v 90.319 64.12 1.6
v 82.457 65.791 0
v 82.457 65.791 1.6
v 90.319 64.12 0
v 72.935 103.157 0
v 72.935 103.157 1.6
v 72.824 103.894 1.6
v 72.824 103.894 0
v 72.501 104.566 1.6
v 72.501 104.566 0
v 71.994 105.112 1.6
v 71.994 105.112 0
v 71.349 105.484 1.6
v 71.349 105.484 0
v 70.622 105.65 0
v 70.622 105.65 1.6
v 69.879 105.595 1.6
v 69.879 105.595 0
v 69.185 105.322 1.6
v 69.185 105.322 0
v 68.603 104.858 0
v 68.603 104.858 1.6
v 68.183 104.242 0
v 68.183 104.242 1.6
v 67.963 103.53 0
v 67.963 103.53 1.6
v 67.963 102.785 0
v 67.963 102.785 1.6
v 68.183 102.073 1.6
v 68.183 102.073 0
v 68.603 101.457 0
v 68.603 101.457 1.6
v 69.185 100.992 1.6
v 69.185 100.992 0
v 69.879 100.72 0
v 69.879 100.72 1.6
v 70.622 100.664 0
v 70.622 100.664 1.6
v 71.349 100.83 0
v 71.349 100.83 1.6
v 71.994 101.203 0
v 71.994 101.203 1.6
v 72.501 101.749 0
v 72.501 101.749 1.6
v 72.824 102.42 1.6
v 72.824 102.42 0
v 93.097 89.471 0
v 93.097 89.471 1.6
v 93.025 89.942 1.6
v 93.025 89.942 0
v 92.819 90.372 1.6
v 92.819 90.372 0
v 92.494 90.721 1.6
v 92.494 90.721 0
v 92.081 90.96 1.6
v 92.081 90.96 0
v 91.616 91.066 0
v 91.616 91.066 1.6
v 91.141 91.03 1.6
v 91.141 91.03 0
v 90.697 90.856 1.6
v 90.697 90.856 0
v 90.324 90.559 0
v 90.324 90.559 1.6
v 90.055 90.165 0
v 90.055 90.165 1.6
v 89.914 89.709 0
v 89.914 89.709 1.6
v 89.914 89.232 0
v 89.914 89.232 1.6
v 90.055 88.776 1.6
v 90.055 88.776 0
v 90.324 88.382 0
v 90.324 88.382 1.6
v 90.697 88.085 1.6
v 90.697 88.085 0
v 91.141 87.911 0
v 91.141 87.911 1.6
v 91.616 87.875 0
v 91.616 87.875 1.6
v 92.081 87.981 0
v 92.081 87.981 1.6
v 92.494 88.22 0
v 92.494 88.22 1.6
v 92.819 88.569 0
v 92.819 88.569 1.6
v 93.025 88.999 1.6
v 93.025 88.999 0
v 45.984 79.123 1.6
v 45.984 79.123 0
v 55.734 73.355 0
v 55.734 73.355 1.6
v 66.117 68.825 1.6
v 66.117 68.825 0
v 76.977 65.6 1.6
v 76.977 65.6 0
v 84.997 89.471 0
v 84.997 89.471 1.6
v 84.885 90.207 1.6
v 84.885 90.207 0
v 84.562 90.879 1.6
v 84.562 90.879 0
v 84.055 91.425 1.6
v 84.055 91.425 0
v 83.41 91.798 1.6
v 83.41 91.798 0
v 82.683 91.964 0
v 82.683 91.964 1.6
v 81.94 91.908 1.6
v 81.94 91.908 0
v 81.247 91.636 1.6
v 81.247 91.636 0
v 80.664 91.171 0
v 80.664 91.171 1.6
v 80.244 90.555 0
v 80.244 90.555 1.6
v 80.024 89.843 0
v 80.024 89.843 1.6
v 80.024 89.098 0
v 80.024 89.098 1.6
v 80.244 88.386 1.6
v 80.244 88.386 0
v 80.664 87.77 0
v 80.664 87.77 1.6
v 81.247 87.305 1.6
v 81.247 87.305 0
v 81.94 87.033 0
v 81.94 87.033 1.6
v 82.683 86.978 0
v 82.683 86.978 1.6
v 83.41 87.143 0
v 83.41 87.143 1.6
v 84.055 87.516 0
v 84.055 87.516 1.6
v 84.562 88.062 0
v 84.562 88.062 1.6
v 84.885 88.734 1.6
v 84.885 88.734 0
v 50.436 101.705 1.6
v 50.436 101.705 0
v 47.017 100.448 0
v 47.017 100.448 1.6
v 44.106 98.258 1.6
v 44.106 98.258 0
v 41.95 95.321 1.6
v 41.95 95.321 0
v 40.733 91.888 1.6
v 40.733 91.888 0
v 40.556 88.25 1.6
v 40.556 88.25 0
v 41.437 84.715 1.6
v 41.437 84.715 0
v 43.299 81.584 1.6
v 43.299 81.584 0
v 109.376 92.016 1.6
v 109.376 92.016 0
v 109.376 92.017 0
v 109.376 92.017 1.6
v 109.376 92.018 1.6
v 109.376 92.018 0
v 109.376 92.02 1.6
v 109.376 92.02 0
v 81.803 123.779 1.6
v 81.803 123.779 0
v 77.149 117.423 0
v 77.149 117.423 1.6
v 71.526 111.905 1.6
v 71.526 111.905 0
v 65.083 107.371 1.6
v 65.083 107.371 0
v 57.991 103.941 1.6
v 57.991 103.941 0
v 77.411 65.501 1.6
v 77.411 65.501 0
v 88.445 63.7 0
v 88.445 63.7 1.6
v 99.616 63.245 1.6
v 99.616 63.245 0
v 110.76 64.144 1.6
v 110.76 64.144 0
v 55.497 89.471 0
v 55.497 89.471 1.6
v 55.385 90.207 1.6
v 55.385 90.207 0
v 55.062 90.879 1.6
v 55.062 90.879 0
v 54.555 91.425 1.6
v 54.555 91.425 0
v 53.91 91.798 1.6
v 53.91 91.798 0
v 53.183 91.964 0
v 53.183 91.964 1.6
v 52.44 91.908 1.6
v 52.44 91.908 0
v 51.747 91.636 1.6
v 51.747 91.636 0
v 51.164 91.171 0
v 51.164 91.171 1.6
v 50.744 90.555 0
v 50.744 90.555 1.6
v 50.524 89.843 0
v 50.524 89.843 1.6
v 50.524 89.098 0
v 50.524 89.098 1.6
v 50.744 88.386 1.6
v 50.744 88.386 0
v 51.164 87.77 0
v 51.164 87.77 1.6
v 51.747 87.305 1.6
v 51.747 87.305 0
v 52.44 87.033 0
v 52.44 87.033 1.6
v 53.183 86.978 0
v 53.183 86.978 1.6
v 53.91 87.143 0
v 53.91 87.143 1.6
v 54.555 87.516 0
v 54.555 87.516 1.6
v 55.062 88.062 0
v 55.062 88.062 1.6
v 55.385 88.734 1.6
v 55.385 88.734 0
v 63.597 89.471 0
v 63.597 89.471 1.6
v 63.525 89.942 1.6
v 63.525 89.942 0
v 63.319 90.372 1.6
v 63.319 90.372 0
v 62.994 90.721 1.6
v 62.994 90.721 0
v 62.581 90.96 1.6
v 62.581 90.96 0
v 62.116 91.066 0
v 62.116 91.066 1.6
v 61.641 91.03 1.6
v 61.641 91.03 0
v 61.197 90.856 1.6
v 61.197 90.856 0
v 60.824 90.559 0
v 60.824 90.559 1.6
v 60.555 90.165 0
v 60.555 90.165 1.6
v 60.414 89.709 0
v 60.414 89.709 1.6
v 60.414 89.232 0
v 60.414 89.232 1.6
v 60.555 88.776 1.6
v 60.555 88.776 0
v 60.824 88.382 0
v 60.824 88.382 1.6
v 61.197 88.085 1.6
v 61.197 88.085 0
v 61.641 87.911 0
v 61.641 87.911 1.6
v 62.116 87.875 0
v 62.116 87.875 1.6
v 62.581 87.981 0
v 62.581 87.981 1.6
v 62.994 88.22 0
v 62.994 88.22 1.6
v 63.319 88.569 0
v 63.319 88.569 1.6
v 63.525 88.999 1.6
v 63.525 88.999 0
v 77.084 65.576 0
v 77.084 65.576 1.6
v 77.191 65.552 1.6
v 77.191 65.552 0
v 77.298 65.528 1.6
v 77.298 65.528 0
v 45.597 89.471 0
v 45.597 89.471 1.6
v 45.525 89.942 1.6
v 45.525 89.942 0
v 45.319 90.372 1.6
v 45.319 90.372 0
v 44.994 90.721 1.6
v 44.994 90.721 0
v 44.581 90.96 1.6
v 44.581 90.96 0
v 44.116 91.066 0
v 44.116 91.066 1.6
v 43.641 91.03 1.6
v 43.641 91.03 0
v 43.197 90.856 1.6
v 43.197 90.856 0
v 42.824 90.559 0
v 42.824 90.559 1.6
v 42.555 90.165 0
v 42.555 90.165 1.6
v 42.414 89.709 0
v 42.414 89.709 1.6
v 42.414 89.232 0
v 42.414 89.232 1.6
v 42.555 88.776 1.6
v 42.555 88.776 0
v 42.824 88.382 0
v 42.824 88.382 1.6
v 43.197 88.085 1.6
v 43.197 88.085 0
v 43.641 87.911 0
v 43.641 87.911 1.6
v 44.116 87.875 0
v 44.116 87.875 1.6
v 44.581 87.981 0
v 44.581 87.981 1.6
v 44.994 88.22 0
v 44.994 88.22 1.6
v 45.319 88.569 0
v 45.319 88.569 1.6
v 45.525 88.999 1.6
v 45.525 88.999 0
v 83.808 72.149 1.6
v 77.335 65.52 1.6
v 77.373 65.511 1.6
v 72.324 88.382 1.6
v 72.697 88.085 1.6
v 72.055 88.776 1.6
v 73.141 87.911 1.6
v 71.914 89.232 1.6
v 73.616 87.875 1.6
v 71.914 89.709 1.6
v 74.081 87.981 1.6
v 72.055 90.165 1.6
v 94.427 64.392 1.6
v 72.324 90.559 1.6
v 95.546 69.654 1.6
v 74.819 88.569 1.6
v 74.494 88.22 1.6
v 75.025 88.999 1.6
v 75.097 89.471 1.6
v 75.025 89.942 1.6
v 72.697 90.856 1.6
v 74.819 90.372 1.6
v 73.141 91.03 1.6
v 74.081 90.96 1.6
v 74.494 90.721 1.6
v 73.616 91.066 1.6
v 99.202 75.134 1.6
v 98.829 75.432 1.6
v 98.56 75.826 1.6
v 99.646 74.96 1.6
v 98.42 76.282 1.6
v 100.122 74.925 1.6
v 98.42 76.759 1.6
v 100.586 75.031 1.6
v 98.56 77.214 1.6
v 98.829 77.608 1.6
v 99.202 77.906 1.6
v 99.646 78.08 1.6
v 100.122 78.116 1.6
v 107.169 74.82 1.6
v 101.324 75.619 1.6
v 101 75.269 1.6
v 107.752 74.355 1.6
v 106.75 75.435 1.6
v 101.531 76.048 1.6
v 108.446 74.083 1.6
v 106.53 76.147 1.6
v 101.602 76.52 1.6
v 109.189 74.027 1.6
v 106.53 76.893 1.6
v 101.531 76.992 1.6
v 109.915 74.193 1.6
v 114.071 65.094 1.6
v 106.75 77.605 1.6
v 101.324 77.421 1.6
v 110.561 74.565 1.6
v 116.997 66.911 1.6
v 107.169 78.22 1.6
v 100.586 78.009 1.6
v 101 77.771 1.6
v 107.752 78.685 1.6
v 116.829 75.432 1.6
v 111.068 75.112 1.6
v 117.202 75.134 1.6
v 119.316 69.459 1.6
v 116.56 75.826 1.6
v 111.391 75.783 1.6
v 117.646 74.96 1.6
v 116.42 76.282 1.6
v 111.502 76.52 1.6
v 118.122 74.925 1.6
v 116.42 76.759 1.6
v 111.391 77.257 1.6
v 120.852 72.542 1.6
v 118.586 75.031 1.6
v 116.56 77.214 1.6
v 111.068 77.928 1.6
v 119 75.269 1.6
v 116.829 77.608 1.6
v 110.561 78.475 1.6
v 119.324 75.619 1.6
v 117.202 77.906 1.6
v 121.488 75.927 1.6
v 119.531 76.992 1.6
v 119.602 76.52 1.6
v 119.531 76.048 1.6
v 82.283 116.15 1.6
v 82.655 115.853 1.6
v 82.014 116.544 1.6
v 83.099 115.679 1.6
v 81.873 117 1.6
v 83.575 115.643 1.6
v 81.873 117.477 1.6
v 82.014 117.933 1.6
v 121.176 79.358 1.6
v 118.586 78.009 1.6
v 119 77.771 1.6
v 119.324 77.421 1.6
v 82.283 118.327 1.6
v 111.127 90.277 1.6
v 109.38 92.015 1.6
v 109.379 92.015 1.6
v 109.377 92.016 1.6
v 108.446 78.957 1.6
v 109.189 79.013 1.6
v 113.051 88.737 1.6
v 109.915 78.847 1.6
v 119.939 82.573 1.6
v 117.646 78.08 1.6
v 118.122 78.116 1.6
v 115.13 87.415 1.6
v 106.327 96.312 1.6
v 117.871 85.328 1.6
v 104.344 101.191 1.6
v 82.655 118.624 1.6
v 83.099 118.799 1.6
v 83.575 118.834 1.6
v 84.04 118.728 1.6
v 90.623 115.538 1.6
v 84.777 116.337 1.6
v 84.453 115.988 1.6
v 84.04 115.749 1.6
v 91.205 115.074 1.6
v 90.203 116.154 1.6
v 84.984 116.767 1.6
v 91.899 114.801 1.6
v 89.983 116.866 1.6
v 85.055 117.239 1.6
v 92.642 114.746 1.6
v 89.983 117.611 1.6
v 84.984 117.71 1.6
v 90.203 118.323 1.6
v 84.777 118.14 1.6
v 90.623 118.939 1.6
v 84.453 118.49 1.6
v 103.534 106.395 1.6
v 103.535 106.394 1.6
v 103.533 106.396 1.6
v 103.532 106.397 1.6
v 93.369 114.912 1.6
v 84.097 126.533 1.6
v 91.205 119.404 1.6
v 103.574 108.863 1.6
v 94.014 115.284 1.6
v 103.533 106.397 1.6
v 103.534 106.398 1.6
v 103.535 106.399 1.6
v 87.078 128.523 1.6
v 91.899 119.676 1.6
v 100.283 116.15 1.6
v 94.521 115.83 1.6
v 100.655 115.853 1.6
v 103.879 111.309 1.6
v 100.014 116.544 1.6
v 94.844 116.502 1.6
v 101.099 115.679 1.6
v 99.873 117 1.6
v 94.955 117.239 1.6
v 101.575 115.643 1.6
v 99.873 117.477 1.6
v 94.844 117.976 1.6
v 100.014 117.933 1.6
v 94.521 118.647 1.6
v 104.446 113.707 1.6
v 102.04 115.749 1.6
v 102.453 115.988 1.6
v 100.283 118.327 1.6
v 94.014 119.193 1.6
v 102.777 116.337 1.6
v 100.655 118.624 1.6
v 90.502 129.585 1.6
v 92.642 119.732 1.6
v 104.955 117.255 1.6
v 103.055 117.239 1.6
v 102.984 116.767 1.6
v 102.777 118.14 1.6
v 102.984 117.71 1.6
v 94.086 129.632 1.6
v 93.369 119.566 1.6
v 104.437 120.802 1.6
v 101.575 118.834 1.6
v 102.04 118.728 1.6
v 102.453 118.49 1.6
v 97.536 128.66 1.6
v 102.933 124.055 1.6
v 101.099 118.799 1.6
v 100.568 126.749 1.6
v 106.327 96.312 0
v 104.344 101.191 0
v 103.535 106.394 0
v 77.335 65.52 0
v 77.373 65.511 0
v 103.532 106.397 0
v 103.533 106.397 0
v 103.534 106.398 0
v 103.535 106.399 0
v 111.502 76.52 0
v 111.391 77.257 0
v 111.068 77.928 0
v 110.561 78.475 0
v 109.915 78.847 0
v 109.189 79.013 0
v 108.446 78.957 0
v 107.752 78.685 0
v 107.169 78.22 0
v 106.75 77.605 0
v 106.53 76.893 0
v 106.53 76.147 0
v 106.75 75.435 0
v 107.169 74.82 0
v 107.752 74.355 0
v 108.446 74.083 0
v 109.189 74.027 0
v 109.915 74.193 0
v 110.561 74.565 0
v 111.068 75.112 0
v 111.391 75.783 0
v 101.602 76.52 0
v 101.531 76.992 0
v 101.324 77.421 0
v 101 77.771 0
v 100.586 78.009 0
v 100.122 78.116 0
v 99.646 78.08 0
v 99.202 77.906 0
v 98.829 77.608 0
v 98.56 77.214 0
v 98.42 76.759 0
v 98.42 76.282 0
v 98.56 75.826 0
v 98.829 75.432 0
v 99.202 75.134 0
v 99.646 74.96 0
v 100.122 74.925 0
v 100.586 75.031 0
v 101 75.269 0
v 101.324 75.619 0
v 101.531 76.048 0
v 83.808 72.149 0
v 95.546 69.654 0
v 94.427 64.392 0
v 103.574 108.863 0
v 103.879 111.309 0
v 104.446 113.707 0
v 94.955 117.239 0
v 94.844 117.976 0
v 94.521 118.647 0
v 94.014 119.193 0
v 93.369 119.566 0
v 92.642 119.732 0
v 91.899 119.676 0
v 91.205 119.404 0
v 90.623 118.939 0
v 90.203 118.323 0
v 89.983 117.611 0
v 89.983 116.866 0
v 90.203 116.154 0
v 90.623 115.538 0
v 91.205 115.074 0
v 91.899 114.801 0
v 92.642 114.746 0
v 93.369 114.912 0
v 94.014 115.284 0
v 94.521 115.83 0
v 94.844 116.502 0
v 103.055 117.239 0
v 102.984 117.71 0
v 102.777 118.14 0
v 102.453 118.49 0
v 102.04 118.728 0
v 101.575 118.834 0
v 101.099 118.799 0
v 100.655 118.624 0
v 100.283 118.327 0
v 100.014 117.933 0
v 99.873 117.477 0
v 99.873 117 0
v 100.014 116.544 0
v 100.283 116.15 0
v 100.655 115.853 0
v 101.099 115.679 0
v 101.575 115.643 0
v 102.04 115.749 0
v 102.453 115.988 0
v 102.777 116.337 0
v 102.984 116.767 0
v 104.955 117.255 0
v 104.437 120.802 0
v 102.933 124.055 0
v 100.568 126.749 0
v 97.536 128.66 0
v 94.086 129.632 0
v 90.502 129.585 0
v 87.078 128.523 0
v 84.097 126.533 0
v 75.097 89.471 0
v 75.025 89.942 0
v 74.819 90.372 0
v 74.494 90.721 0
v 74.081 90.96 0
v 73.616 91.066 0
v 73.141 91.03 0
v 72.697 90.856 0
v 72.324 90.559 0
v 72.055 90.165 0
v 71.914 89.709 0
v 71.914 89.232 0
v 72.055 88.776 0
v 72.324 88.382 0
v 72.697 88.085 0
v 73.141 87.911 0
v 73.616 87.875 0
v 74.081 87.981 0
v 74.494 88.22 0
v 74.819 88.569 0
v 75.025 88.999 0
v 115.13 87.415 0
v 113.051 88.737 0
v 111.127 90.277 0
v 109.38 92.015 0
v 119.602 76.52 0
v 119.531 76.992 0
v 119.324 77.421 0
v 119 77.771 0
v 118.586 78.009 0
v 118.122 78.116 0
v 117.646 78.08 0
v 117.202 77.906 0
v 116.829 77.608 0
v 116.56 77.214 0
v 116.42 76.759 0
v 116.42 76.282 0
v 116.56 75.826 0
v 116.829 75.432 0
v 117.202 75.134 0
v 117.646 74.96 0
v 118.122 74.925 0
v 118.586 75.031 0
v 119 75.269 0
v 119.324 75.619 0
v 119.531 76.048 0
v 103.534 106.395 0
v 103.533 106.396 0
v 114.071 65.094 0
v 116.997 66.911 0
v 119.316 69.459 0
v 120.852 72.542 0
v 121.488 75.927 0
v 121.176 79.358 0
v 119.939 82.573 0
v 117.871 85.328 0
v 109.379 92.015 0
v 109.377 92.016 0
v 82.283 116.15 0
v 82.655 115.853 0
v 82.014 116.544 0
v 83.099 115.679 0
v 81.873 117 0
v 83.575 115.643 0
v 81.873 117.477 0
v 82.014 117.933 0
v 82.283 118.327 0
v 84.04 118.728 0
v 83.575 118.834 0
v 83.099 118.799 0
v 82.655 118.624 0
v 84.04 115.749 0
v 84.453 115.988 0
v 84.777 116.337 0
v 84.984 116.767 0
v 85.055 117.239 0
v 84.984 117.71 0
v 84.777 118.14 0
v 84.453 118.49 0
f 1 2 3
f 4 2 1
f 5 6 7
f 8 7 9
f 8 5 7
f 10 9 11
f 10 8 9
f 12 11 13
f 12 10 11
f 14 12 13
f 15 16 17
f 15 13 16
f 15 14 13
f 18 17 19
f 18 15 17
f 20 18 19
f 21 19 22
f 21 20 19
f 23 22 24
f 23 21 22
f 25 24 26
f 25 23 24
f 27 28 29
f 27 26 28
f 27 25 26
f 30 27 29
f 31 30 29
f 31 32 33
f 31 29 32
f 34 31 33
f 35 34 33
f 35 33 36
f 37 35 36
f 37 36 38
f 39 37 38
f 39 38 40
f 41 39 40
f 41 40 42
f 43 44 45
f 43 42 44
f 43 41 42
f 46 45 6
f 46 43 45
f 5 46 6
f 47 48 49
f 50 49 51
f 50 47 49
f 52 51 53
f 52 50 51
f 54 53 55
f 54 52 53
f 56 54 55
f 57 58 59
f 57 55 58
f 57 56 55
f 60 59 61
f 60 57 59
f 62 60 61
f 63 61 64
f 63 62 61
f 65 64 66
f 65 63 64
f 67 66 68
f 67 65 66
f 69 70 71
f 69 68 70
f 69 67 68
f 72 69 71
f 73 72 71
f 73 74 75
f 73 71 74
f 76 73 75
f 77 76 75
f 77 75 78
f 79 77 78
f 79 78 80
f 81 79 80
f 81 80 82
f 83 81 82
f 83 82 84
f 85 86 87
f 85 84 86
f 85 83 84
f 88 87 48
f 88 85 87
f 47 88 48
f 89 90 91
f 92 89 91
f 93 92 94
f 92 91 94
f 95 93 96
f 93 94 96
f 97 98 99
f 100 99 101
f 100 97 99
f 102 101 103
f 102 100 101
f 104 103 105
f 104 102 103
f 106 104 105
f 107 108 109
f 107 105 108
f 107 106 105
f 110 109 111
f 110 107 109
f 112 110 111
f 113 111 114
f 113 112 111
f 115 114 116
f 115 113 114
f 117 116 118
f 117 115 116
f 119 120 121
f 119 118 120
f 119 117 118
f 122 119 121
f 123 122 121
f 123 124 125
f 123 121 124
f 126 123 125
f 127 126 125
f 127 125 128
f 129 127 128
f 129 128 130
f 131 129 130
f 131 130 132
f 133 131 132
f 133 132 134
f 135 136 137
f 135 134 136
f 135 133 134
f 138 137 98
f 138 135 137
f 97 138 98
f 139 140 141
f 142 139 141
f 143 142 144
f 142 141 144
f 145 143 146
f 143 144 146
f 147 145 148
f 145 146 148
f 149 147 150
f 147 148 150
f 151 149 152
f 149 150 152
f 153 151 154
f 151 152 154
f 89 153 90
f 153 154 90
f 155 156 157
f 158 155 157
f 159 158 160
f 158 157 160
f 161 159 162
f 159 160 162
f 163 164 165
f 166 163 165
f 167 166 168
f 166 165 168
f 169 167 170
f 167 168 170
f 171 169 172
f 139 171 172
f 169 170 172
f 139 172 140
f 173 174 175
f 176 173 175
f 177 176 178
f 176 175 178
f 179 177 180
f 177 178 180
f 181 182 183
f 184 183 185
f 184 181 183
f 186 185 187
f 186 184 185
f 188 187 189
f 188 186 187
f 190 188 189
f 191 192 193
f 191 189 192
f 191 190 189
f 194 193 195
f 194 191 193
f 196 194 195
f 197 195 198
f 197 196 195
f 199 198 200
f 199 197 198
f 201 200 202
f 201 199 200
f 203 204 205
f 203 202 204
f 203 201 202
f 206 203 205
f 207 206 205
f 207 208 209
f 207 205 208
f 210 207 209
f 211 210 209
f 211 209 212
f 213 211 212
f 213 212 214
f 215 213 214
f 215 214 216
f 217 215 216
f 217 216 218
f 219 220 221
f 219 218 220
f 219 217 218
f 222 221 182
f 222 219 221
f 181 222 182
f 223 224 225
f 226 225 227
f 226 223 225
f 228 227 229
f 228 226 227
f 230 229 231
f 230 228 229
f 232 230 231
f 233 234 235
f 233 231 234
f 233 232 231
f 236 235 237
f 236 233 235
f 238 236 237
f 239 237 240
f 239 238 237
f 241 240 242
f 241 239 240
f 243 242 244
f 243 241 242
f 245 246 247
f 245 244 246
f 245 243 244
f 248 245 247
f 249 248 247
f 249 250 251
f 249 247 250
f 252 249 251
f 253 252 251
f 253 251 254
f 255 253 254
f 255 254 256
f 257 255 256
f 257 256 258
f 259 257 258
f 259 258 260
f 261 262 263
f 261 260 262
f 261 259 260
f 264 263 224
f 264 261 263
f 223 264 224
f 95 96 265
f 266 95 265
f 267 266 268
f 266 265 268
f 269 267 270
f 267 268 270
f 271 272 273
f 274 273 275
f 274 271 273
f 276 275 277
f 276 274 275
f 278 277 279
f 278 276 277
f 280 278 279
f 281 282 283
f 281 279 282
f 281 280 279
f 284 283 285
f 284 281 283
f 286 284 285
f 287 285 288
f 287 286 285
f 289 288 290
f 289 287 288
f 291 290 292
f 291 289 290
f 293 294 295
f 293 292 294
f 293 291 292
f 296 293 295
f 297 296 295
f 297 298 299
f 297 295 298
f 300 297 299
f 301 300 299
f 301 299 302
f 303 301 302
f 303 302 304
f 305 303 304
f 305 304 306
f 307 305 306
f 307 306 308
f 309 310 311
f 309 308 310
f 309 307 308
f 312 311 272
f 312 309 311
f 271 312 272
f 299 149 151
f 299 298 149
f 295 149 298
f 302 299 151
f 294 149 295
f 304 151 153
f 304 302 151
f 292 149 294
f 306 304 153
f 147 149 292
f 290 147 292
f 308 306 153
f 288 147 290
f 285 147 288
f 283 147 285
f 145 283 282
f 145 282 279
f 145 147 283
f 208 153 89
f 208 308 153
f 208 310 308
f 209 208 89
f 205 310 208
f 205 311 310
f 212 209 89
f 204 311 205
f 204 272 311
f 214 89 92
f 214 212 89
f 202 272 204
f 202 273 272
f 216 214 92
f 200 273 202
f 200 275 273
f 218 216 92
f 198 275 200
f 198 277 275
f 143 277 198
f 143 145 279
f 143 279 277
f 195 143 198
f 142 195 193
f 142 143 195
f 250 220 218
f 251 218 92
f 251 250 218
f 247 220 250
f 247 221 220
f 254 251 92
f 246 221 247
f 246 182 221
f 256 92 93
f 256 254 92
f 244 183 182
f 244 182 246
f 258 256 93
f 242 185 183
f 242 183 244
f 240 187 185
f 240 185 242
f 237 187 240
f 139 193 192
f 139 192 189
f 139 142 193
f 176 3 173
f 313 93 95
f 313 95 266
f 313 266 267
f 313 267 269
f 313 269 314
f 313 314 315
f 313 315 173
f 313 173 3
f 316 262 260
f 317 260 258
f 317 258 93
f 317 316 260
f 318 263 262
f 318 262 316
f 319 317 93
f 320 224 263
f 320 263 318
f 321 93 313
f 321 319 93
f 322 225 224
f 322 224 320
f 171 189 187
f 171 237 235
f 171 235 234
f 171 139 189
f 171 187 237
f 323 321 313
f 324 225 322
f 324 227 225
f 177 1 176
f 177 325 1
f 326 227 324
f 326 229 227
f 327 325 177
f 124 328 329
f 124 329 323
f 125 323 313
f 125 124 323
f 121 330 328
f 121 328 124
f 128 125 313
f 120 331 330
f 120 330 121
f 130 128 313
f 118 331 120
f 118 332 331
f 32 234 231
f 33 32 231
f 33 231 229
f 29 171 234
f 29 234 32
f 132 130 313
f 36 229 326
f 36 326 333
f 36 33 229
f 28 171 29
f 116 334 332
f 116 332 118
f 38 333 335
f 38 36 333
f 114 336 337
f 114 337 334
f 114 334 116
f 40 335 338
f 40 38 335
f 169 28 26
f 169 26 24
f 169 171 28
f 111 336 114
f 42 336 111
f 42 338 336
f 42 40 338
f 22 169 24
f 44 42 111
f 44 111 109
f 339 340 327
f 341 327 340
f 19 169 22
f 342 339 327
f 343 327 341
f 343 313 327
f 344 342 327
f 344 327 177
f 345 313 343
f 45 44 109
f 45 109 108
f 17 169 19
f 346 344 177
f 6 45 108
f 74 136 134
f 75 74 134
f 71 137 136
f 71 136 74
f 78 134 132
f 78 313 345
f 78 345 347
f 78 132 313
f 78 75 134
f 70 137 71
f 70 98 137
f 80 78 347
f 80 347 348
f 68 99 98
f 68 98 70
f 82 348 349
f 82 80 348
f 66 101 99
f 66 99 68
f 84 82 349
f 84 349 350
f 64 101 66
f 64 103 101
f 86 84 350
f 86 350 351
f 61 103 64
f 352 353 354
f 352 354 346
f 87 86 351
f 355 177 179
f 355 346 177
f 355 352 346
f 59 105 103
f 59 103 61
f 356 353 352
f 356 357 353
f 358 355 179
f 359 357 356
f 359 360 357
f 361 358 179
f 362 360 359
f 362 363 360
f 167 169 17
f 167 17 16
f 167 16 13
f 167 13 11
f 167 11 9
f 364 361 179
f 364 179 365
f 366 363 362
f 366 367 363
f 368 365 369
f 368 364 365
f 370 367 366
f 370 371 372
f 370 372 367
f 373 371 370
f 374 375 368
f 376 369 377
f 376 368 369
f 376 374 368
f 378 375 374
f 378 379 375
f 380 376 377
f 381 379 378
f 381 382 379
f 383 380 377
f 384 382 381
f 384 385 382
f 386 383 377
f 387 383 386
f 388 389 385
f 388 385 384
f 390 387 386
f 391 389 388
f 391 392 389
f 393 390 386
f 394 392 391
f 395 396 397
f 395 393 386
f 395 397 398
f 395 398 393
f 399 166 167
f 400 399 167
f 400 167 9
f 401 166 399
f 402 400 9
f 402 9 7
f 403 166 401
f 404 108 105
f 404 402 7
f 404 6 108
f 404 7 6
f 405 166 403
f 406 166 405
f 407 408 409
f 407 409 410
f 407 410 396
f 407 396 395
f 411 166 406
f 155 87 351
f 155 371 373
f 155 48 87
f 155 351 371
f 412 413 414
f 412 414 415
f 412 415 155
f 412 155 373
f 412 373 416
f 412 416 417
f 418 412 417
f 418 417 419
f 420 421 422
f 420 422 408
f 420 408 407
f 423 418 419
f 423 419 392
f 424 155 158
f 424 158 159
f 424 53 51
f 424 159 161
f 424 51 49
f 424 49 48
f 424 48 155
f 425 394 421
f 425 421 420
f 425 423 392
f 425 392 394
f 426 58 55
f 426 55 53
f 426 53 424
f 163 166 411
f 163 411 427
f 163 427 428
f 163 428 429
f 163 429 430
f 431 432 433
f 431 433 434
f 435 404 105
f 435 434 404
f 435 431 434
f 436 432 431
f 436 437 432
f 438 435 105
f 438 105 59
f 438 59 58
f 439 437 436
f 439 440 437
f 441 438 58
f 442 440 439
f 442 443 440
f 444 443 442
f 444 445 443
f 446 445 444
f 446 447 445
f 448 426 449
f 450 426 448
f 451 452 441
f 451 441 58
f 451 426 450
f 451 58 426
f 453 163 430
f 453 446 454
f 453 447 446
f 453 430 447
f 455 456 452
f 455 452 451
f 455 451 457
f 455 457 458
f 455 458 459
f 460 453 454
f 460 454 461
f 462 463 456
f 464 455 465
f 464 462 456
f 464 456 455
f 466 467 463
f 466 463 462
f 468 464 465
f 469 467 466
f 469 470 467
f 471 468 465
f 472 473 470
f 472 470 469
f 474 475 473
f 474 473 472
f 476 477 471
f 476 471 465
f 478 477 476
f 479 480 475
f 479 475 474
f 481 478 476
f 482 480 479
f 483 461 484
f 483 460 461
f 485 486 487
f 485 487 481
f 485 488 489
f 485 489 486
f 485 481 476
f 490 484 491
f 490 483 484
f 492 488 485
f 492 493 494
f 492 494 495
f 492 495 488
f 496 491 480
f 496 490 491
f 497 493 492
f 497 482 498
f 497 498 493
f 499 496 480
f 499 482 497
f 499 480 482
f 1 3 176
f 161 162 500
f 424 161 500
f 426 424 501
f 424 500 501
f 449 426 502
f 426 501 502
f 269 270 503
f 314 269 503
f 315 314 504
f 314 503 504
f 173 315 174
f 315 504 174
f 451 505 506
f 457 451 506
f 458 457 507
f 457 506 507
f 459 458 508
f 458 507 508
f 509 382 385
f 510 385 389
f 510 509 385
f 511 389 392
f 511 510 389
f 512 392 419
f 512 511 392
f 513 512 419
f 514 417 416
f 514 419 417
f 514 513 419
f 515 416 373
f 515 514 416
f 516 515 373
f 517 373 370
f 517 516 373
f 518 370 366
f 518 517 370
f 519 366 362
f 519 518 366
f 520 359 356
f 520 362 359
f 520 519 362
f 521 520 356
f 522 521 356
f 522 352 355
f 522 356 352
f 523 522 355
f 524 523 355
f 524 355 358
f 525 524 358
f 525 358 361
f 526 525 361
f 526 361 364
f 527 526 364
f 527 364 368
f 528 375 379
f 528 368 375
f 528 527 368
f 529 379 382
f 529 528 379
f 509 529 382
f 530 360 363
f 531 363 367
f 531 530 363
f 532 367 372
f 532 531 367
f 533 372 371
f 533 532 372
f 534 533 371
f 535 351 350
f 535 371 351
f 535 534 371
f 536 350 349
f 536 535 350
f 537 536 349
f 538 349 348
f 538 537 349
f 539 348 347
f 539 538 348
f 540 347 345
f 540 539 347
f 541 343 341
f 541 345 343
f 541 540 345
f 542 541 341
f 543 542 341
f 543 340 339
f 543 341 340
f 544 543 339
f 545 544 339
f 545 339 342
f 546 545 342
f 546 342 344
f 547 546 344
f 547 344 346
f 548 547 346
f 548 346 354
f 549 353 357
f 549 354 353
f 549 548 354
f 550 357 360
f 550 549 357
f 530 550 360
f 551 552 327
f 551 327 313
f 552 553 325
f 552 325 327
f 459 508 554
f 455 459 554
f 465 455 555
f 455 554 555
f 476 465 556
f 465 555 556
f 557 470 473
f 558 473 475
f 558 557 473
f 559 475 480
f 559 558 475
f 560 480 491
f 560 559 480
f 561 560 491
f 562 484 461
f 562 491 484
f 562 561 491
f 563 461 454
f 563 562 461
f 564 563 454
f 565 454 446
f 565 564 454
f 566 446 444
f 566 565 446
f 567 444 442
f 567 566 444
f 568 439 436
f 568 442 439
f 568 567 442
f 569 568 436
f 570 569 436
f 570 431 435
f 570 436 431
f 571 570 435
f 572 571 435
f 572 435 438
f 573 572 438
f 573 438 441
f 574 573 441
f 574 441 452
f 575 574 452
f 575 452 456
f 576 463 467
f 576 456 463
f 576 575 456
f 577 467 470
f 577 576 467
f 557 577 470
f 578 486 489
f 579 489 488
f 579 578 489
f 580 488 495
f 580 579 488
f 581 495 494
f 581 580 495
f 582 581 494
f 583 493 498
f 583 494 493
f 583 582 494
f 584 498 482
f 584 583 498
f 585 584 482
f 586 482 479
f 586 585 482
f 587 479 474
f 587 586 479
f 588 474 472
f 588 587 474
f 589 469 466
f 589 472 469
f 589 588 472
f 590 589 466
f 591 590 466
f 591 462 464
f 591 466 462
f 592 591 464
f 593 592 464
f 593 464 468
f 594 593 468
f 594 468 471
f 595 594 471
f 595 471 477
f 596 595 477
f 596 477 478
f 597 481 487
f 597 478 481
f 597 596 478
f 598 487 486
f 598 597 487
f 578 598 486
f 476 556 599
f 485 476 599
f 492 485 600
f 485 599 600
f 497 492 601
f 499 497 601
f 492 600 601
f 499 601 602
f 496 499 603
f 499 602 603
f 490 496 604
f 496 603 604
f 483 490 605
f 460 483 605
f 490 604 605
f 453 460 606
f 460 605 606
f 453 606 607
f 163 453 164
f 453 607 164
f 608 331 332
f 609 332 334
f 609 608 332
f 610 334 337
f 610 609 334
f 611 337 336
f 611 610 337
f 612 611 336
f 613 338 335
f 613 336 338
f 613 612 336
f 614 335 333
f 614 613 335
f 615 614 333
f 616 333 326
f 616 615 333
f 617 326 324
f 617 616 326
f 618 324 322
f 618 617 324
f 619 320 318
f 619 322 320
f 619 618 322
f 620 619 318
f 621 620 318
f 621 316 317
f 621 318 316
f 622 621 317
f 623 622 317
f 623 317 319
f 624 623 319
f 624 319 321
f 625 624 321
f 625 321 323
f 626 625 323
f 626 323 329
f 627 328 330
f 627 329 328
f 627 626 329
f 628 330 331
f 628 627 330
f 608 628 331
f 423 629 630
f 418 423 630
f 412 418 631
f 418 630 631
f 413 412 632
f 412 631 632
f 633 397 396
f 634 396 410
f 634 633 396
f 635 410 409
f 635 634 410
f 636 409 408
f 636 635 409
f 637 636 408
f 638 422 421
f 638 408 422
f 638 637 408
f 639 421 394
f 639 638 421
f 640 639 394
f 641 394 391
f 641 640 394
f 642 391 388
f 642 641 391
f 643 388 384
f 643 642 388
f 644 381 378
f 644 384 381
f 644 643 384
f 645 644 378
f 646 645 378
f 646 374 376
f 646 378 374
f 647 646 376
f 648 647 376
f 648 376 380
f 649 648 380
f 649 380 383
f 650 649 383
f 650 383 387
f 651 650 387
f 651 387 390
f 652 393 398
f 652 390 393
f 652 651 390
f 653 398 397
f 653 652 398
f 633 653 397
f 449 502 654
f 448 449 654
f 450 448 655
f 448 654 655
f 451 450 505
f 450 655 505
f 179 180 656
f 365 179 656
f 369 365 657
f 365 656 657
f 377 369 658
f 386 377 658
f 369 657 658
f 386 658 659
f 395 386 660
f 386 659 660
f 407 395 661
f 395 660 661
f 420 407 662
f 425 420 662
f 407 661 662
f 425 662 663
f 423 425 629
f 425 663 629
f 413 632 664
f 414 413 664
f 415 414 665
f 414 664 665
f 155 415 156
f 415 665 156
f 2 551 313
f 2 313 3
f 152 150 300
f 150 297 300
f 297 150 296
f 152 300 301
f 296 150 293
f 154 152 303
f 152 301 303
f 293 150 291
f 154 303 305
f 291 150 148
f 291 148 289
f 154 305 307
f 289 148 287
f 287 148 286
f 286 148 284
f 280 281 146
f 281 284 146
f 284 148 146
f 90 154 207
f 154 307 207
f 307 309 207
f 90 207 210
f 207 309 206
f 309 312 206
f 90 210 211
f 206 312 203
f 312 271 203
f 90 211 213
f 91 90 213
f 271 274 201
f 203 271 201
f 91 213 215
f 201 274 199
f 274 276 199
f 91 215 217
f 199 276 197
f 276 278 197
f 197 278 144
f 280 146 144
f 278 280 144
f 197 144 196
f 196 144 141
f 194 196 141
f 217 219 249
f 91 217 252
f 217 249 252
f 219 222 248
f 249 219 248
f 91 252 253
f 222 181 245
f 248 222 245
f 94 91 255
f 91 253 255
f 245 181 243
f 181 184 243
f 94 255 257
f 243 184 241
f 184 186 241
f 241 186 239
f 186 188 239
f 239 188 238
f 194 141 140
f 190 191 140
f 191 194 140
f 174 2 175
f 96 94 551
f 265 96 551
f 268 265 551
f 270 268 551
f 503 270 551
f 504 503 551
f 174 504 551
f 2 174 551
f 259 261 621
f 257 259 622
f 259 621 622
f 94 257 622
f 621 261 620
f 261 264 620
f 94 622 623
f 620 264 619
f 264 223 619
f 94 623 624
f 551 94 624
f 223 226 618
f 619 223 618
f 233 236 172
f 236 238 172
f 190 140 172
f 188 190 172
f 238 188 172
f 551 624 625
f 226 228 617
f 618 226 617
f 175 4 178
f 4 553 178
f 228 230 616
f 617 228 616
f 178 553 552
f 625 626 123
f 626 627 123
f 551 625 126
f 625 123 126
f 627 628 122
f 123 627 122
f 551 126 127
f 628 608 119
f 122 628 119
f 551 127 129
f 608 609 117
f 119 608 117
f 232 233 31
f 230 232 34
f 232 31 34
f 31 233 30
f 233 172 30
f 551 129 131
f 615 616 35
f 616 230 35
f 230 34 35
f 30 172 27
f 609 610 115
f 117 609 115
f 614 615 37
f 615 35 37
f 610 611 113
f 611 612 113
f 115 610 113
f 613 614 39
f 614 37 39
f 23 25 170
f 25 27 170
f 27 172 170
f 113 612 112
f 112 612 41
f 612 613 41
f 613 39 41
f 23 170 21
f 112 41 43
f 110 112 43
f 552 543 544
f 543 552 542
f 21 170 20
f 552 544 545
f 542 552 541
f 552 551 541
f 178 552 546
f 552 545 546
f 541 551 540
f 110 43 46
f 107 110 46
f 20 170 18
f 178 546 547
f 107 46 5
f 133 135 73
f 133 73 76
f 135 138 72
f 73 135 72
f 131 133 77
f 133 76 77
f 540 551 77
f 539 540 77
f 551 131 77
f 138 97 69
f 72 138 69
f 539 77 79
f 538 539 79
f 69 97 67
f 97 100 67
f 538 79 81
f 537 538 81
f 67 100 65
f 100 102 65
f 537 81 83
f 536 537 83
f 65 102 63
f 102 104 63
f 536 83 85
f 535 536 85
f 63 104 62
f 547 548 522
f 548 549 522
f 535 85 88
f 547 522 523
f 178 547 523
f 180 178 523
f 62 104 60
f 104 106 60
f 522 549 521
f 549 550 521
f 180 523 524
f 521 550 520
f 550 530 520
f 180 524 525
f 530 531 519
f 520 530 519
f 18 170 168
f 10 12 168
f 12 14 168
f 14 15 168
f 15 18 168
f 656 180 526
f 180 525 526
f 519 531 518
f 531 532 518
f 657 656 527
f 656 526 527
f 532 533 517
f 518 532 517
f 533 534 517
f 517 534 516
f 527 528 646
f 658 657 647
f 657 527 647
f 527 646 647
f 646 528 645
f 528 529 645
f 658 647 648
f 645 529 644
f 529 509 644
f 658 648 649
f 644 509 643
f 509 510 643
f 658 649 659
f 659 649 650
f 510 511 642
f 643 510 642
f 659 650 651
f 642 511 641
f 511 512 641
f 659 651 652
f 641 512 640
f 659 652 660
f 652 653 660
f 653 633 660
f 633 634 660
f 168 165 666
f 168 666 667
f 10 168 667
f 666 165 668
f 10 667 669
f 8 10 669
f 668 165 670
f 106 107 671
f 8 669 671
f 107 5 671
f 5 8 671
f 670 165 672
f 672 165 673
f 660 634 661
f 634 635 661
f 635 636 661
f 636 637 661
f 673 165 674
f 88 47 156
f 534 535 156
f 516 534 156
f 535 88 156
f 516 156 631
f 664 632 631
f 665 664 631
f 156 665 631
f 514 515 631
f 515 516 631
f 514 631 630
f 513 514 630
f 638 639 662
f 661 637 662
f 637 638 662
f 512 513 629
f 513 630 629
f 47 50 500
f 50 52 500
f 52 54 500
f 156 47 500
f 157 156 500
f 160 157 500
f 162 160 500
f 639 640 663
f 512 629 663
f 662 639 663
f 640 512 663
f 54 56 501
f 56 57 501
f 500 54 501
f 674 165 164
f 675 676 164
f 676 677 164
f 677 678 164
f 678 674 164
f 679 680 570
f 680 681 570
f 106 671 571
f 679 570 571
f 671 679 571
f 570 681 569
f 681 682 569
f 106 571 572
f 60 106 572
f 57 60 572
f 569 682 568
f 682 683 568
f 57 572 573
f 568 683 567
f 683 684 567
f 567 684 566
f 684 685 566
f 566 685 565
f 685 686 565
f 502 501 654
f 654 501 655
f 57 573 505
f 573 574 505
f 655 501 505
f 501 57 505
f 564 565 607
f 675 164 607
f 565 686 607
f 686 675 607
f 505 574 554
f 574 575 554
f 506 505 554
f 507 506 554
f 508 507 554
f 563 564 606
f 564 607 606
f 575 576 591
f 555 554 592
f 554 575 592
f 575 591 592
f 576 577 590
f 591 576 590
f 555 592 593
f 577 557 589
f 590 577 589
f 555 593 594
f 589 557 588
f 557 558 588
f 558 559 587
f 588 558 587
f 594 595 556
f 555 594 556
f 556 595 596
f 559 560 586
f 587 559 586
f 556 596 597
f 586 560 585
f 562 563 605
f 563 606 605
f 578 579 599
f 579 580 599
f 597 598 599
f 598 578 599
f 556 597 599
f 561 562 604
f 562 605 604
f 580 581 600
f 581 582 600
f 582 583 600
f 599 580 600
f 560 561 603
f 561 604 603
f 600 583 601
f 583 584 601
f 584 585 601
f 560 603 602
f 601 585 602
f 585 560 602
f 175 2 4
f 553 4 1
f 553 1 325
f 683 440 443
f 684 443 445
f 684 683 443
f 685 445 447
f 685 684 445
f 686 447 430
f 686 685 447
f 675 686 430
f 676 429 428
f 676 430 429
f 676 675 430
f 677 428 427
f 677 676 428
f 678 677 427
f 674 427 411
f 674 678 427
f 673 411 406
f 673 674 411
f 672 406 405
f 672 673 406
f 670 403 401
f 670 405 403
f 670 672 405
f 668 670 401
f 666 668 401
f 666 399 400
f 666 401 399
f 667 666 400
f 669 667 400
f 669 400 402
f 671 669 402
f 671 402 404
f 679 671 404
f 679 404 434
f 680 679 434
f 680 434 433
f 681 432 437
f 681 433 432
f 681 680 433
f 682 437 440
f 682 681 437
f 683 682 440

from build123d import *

# Parameters (mm, degrees)
BOSS_EXTRUDE1_DEPTH = 1.6
SKETCH8_3_R         = 2.5
CUT_EXTRUDE1_DEPTH  = 178.756608161
SKETCH25_R          = 2.5
CUT_EXTRUDE2_DEPTH  = 178.756608161
SKETCH16_R          = 1.6
CUT_EXTRUDE3_DEPTH  = 178.756608161
CUT_EXTRUDE6_DEPTH  = 175.275284078


with BuildPart() as part:
    # Sketch8 → Boss-Extrude1 (new body)
    with BuildSketch(Plane.XY):
        with BuildLine():
            ThreePointArc((103.534701401, 106.398987898), (103.693161759, 110.090138371), (104.446158593, 113.707139515))
            ThreePointArc((104.446158593, 113.707139515), (97.535722451, 128.659745128), (81.803110207, 123.779227301))
            ThreePointArc((81.803110207, 123.779227301), (68.396685685, 109.506582784), (50.436082024, 101.705472858))
            ThreePointArc((50.436082024, 101.705472858), (40.732585656, 91.888172428), (45.984244445, 79.122699094))
            ThreePointArc((45.984244445, 79.122699094), (60.856228216, 70.93053968), (76.976923111, 65.600382715))
            ThreePointArc((76.976923111, 65.600382715), (77.137220348, 65.563882378), (77.2977589, 65.528458486))
            ThreePointArc((77.2977589, 65.528458486), (77.354298773, 65.515492739), (77.410522602, 65.501218676))
            ThreePointArc((77.410522602, 65.501218676), (94.023303804, 63.303193357), (110.759742778, 64.144278965))
            ThreePointArc((110.759742778, 64.144278965), (121.287127646, 74.212620667), (115.130462452, 87.414620912))
            ThreePointArc((115.130462452, 87.414620912), (112.067901623, 89.481121015), (109.379631064, 92.015465685))
            ThreePointArc((109.379631064, 92.015465685), (109.377986421, 92.015505684), (109.376341775, 92.015545509))
            ThreePointArc((109.376341775, 92.015545509), (109.37615287, 92.017539878), (109.375963817, 92.019534234))
            ThreePointArc((109.375963817, 92.019534234), (105.194093866, 98.693961054), (103.534911629, 106.393514545))
            ThreePointArc((103.534911629, 106.393514545), (103.533655951, 106.395075463), (103.532400156, 106.396636288))
            ThreePointArc((103.532400156, 106.396636288), (103.533550841, 106.397812032), (103.534701401, 106.398987898))
        make_face()
    extrude(amount=BOSS_EXTRUDE1_DEPTH)

    # Sketch8<3> → Cut-Extrude1 (cut, through all)
    with BuildSketch(Plane.XY):
        with Locations((70.435309654, 103.157249982)):
            Circle(SKETCH8_3_R)
    extrude(amount=CUT_EXTRUDE1_DEPTH, mode=Mode.SUBTRACT)

    # Sketch25 → Cut-Extrude2 (cut, through all)
    with BuildSketch(Plane.XY):
        with Locations((52.996556322, 89.470524089)):
            Circle(SKETCH25_R)
        with Locations((82.496556322, 89.470524089)):
            Circle(SKETCH25_R)
        with Locations((92.45540719, 117.238694526)):
            Circle(SKETCH25_R)
        with Locations((109.001946024, 76.520067852)):
            Circle(SKETCH25_R)
    extrude(amount=CUT_EXTRUDE2_DEPTH, mode=Mode.SUBTRACT)

    # Sketch16 → Cut-Extrude3 (cut, through all)
    with BuildSketch(Plane.XY):
        with Locations((43.996556322, 89.470524089)):
            Circle(SKETCH16_R)
        with Locations((61.996556322, 89.470524089)):
            Circle(SKETCH16_R)
        with Locations((73.496556322, 89.470524089)):
            Circle(SKETCH16_R)
        with Locations((91.496556322, 89.470524089)):
            Circle(SKETCH16_R)
        with Locations((100.001946024, 76.520067852)):
            Circle(SKETCH16_R)
        with Locations((118.001946024, 76.520067852)):
            Circle(SKETCH16_R)
        with Locations((83.45540719, 117.238694526)):
            Circle(SKETCH16_R)
        with Locations((101.45540719, 117.238694526)):
            Circle(SKETCH16_R)
    extrude(amount=CUT_EXTRUDE3_DEPTH, mode=Mode.SUBTRACT)

    # Sketch23 → Cut-Extrude6 (cut, through all)
    with BuildSketch(Plane(origin=(-19.097367964, 26.776820286, 0), x_dir=(0.9781476007338056, -0.2079116908177598, 0), z_dir=(0, 0, 1))):
        Polygon((103.223291241, 65.776224437), (91.223291241, 65.776224437), (91.223291241, 59.276224437), (99.26102874, 59.276224437), (103.223291241, 60.39602146), align=None)
    extrude(amount=CUT_EXTRUDE6_DEPTH, mode=Mode.SUBTRACT)


solid = part.part
